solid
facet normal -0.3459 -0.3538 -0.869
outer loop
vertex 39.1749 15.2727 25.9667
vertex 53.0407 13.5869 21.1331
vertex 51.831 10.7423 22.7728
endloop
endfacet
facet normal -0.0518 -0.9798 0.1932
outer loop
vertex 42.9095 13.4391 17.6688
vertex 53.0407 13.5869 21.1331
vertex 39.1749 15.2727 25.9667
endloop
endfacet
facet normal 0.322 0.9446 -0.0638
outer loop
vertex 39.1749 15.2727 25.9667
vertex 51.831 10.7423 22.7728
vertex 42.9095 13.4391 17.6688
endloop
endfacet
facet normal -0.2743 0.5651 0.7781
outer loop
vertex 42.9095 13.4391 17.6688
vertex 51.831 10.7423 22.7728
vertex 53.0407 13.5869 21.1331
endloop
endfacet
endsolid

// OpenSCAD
// Auto-generated auxetic polyhedron
points = [
    [51.831034, 10.742253, 22.772811],
    [53.040690, 13.586930, 21.133137],
    [39.174942, 15.272691, 25.966678],
    [42.909499, 13.439076, 17.668848],
];

faces = [
    [0, 1, 2],
    [2, 1, 3],
    [3, 0, 2],
    [1, 0, 3],
];

polyhedron(points = points, faces = faces);
